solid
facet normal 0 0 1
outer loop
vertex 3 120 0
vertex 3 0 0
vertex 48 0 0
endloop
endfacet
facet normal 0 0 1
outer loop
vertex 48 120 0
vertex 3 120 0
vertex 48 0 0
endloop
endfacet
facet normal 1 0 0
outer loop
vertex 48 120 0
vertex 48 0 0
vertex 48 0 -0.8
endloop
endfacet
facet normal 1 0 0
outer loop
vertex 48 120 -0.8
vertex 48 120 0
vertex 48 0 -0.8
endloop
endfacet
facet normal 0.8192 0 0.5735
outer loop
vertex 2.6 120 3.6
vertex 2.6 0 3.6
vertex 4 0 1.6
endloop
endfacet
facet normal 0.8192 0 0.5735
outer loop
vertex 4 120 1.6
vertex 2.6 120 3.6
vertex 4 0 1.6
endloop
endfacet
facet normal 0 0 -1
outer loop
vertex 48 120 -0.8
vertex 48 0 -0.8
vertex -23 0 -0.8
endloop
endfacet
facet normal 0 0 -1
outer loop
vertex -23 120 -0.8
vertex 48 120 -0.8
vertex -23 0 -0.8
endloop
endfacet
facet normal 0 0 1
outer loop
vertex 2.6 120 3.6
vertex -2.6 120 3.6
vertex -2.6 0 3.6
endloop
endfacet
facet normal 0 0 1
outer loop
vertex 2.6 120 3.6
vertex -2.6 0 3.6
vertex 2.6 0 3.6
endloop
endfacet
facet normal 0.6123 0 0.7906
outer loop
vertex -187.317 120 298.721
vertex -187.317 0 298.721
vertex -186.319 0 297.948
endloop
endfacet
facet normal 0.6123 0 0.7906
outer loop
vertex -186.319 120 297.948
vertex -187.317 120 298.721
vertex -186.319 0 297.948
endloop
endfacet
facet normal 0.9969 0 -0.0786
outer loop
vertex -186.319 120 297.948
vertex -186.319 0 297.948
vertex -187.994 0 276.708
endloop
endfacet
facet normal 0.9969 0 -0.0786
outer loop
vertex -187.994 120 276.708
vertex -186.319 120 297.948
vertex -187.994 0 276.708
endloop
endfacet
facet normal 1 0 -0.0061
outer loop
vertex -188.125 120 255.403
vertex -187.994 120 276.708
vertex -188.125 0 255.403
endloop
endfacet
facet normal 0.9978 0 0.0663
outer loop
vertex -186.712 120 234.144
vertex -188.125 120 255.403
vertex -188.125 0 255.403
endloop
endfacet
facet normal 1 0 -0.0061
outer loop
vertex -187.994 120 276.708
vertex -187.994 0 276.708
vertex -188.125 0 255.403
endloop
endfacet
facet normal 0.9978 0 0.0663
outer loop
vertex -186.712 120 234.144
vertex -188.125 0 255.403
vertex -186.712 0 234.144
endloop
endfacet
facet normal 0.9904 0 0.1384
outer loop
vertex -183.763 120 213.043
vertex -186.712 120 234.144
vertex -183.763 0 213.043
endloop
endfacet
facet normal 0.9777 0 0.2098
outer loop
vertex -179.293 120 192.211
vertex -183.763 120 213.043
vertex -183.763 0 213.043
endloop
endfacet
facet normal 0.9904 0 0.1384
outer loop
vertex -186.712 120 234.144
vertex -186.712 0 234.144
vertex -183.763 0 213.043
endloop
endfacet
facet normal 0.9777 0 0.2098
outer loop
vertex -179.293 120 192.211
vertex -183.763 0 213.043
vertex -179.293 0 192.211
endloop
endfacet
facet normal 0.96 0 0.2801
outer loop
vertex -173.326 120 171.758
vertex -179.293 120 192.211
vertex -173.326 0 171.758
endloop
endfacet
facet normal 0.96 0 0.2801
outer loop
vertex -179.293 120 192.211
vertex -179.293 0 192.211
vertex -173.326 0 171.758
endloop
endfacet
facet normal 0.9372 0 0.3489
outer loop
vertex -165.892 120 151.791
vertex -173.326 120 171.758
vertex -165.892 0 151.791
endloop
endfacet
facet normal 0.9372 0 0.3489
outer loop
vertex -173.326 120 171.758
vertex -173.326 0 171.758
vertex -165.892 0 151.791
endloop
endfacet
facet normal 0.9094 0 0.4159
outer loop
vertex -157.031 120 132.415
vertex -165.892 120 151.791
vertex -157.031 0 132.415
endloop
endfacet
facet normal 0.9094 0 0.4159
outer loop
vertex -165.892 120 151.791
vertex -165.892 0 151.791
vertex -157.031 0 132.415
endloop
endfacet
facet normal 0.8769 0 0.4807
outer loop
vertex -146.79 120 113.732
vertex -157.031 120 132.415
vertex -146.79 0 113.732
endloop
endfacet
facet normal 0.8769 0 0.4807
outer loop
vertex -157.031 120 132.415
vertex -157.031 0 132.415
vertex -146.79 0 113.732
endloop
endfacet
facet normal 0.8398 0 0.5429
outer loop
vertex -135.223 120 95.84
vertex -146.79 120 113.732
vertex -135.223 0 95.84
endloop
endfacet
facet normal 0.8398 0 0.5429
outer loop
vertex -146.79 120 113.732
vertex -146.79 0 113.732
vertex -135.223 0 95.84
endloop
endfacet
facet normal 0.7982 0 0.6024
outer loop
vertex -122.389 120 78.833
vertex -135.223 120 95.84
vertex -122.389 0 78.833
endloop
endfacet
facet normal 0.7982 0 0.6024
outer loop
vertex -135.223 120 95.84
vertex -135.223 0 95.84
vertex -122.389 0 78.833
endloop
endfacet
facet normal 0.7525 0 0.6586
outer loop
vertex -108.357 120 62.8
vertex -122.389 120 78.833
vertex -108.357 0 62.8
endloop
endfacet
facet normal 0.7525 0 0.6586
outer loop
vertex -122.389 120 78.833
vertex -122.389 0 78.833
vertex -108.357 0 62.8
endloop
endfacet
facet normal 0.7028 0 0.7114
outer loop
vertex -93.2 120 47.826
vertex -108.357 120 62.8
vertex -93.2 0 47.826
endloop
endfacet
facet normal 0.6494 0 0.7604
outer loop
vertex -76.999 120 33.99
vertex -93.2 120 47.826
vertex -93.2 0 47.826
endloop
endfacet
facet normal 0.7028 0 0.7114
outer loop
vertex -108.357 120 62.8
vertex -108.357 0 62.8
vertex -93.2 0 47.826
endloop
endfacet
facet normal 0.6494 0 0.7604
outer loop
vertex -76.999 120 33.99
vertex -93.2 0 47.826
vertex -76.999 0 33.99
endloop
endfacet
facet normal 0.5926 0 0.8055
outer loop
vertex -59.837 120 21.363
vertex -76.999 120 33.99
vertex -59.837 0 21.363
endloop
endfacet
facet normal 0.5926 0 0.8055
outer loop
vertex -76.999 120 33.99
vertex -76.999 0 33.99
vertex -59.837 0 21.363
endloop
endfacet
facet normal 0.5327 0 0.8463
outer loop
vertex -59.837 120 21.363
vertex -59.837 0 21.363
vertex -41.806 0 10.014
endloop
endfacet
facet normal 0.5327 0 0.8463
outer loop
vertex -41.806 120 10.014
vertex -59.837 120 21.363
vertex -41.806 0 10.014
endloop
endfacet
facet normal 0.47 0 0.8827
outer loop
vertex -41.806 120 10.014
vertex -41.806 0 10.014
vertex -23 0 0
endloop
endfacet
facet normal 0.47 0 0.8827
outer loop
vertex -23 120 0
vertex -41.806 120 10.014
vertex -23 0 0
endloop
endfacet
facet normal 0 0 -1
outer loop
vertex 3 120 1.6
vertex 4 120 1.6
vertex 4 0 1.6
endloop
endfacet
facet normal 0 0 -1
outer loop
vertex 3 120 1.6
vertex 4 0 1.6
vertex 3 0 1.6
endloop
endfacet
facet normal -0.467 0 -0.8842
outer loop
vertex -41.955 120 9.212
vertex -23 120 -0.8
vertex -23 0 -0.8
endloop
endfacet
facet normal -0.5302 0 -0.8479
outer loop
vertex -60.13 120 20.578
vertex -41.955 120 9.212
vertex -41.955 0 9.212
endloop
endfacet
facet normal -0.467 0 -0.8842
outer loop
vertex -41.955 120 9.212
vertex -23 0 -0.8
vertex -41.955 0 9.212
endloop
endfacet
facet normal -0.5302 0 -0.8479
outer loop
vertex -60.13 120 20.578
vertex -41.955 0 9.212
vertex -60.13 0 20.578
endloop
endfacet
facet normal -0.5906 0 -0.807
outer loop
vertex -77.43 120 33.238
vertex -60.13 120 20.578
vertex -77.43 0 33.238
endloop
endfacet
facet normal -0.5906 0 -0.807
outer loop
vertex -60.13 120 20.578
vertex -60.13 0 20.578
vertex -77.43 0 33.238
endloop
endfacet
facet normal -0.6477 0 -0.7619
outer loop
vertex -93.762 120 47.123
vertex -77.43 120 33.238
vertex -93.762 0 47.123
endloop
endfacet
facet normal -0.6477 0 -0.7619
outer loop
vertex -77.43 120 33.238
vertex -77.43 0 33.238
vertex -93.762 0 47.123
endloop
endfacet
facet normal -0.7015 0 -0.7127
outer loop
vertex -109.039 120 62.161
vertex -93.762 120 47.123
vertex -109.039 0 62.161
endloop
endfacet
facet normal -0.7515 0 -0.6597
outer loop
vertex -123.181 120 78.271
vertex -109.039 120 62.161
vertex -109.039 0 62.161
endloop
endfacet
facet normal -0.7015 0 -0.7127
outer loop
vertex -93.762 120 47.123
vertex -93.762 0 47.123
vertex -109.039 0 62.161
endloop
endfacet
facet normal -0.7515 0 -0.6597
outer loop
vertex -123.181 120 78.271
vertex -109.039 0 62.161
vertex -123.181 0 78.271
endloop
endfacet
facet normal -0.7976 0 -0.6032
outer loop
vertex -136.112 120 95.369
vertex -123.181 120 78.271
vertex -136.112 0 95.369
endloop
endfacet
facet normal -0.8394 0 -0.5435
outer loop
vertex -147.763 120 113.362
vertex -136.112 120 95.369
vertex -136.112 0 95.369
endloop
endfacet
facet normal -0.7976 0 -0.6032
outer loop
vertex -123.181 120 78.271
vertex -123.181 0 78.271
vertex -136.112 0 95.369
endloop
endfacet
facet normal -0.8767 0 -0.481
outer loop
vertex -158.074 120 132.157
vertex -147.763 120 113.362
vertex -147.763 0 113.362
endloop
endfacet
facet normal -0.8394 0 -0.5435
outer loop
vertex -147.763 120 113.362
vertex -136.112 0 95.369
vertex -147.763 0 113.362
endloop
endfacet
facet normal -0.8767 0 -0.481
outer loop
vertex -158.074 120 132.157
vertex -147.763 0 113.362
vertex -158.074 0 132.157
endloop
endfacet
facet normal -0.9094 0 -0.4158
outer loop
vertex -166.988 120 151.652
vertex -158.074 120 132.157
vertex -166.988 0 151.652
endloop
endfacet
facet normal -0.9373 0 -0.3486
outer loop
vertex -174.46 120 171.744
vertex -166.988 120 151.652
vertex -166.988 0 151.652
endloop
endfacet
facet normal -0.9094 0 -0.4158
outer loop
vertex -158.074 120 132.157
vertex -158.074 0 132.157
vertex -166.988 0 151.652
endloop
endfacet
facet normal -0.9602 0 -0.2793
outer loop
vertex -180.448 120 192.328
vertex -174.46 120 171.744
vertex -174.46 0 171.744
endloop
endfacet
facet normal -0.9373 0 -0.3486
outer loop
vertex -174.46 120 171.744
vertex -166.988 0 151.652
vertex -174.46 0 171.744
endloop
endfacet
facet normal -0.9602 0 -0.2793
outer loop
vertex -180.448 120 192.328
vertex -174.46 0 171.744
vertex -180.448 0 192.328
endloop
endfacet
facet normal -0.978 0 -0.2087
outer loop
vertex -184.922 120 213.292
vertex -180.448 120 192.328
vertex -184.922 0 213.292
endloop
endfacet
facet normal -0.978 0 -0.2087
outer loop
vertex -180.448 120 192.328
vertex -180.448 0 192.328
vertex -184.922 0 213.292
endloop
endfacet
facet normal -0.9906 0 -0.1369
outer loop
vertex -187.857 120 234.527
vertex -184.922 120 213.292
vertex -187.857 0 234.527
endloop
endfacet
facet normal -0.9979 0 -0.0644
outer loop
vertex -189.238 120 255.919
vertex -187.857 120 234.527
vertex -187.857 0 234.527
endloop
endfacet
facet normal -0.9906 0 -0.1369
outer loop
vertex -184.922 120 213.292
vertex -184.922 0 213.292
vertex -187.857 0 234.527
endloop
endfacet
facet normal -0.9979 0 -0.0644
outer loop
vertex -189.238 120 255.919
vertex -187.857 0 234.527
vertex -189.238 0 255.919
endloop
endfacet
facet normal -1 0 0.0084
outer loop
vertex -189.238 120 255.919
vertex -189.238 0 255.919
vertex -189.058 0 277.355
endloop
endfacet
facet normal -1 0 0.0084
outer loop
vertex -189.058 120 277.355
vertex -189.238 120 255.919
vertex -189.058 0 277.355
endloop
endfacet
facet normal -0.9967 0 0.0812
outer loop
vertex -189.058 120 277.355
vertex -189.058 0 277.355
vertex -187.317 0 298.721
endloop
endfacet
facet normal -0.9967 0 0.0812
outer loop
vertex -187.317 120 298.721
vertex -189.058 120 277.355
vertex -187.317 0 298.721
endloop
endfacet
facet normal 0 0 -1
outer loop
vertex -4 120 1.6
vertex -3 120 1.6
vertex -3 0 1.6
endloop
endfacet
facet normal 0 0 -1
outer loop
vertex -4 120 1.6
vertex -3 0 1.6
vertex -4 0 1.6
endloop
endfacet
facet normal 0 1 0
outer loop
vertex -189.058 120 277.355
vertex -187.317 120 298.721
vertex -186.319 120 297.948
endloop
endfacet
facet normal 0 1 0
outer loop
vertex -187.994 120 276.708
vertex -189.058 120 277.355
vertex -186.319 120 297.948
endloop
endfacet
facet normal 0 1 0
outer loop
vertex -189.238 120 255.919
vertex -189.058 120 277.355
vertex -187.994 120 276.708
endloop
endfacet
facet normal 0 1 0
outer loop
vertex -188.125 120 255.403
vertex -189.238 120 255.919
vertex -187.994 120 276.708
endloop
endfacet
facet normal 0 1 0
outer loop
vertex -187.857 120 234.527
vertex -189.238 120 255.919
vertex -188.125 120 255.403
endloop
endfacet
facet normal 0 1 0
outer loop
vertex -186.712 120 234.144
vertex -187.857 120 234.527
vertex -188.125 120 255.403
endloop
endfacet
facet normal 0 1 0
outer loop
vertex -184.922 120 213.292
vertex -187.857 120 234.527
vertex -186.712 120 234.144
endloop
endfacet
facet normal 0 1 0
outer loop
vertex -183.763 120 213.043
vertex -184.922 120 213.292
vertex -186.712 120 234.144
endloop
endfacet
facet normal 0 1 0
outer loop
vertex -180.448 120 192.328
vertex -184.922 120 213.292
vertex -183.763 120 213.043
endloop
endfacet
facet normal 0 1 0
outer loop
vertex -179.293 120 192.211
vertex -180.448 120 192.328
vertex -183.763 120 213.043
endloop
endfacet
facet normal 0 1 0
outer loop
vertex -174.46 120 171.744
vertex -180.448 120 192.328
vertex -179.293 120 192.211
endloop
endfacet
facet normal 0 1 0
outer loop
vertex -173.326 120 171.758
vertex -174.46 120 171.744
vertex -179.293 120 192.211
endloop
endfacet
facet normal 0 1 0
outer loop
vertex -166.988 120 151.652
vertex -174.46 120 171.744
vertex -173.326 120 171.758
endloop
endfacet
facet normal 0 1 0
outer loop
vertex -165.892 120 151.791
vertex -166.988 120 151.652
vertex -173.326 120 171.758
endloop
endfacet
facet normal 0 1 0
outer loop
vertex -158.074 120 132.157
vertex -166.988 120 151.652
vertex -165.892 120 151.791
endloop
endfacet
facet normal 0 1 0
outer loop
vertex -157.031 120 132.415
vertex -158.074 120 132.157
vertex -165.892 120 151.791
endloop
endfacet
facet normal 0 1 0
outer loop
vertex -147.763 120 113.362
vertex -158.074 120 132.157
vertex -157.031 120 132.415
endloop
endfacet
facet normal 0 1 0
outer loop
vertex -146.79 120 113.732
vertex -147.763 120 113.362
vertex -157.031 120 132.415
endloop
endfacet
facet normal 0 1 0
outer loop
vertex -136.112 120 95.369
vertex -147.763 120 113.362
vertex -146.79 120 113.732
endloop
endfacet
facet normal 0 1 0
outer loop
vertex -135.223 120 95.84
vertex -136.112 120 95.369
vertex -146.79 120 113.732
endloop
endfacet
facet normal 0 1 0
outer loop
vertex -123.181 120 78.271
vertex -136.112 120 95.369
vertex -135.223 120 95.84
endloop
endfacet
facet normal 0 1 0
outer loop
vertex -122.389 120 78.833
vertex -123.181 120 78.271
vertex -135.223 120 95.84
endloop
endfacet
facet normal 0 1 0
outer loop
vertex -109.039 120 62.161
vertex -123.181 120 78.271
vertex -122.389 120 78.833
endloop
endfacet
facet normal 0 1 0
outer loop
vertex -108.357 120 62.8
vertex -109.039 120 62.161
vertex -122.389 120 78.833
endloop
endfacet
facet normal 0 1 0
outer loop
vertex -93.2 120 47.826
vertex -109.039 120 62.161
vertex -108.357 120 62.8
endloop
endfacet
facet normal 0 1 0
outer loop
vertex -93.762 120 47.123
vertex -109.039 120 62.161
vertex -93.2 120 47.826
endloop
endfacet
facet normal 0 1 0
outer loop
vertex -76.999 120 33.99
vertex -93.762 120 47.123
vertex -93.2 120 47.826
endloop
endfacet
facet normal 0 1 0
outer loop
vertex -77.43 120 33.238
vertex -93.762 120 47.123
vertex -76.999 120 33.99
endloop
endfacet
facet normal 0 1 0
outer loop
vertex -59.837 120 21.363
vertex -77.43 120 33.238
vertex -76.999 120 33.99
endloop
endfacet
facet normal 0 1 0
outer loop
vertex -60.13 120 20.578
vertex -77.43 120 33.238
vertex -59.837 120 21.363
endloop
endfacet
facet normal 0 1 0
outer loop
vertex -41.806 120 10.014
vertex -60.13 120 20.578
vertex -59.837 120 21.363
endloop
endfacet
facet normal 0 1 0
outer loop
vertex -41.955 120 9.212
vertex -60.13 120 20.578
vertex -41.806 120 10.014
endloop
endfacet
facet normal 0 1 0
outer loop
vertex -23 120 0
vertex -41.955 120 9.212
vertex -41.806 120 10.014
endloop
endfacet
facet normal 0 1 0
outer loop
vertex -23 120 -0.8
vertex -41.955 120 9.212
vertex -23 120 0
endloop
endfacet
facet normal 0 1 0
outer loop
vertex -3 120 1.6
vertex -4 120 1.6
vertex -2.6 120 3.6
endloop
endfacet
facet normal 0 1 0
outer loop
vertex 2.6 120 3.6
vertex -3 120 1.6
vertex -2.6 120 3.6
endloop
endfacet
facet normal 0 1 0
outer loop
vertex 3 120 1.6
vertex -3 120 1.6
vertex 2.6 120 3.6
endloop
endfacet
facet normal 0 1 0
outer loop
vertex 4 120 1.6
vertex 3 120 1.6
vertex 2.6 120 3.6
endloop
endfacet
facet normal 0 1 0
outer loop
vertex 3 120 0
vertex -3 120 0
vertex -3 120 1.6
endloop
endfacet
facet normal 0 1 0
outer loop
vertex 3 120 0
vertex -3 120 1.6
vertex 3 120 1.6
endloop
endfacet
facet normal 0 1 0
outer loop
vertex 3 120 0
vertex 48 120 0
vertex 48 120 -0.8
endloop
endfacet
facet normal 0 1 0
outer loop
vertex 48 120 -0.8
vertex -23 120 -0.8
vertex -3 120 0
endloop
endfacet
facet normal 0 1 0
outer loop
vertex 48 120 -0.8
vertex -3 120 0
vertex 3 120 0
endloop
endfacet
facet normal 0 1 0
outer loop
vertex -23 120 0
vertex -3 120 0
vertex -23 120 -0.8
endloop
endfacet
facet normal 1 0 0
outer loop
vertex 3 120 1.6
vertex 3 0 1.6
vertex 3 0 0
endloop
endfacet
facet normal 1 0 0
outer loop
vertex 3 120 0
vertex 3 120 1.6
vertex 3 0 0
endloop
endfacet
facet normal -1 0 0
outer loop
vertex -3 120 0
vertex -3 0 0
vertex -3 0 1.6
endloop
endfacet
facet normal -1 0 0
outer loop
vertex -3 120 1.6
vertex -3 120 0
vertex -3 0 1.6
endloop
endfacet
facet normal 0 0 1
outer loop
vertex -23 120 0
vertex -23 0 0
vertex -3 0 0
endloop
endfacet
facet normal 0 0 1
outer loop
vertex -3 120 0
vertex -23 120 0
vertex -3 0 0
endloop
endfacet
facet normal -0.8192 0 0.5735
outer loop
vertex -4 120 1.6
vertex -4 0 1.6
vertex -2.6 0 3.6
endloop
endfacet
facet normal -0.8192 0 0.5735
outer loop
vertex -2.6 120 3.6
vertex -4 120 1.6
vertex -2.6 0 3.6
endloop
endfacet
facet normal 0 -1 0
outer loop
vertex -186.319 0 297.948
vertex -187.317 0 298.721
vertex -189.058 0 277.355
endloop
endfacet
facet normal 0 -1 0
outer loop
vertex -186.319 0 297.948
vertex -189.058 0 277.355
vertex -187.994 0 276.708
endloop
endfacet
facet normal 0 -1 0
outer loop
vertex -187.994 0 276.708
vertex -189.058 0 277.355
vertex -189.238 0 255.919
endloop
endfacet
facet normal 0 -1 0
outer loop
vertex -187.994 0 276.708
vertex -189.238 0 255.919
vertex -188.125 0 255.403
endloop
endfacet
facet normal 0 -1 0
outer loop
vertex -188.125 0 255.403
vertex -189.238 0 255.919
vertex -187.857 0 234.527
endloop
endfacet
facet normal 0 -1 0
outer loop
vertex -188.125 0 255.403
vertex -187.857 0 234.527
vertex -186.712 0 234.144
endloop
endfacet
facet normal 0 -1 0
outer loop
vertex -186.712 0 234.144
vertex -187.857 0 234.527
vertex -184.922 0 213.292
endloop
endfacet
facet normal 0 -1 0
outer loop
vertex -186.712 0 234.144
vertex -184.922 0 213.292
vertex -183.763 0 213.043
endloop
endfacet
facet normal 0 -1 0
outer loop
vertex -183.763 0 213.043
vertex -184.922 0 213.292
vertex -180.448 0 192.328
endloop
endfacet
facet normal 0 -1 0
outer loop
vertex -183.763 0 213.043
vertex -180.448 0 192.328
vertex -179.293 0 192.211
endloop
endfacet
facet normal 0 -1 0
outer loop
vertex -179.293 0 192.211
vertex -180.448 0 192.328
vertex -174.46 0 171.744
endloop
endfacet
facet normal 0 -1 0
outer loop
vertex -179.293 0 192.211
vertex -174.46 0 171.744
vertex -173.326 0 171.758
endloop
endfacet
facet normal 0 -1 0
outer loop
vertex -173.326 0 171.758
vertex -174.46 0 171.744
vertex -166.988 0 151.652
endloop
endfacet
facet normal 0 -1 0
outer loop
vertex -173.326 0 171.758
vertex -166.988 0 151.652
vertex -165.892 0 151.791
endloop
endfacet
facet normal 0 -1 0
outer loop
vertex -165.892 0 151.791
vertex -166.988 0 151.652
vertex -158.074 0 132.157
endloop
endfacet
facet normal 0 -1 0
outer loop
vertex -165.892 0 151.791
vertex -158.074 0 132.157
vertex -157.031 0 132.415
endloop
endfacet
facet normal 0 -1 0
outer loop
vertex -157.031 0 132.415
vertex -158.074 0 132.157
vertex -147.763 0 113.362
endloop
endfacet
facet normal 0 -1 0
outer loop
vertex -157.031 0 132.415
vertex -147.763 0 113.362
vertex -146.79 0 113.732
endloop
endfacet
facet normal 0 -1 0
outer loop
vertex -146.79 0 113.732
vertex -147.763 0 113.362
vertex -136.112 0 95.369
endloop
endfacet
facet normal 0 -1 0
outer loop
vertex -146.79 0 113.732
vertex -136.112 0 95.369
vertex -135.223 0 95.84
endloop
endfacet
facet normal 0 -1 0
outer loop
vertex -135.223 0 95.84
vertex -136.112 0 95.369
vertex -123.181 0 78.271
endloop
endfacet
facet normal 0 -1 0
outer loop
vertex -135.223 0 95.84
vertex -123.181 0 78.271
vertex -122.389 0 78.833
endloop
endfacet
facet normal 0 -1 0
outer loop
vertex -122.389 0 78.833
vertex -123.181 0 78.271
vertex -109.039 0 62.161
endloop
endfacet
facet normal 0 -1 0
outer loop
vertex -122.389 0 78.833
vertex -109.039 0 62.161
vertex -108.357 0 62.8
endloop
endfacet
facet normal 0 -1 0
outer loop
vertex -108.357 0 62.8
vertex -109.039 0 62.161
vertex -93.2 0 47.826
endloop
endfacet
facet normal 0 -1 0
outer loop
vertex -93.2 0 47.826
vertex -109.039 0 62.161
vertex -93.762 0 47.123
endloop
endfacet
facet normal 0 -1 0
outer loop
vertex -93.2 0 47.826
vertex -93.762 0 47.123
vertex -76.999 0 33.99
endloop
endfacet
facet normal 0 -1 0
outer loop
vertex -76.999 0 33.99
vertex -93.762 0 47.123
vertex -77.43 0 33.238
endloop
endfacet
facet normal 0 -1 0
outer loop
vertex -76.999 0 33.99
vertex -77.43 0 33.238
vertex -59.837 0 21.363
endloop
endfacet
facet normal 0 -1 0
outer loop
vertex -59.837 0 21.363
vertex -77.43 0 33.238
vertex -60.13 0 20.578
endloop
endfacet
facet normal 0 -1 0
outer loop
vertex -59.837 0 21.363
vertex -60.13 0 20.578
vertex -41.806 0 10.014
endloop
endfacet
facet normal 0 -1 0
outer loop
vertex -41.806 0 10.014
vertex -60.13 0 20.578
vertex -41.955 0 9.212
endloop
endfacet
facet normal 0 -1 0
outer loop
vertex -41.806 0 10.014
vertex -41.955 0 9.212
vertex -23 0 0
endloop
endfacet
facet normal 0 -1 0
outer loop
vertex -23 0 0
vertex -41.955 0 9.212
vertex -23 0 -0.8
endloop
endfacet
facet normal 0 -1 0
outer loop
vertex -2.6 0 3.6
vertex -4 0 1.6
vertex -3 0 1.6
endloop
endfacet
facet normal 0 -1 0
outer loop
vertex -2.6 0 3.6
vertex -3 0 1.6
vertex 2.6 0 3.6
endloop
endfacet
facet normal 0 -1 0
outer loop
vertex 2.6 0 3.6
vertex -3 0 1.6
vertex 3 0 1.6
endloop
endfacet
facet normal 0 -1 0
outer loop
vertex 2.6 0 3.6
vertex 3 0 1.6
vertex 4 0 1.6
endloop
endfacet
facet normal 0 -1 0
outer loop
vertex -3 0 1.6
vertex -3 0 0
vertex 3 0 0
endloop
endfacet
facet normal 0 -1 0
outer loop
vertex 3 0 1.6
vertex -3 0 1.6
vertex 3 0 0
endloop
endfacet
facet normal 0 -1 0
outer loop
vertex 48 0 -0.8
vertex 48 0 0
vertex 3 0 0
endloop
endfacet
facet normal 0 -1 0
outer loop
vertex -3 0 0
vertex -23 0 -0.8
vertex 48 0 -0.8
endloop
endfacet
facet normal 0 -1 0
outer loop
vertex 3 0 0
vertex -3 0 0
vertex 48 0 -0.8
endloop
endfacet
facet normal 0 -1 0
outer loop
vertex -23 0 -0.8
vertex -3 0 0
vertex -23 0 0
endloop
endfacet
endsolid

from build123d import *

# Parameters (mm, degrees)
BOSS_EXTRUDE1_DEPTH = 120


with BuildPart() as part:
    # Sketch1 → Boss-Extrude1 (new body)
    with BuildSketch(Plane(origin=(0, 0, 0), x_dir=(1, 0, 0), z_dir=(0, 1, 0))):
        with BuildLine():
            Line((-3, 0), (-3, -1.6))
            Line((-3, -1.6), (-4, -1.6))
            Line((-4, -1.6), (-2.599584924, -3.6))
            Line((-2.599584924, -3.6), (2.599584924, -3.6))
            Line((2.599584924, -3.6), (4, -1.6))
            Line((4, -1.6), (3, -1.6))
            Line((3, -1.6), (3, 0))
            Line((3, 0), (48, 0))
            Line((48, 0), (48, 0.8))
            Line((48, 0.8), (-23, 0.8))
            ThreePointArc((-23, 0.8), (-153.089844763, -122.665428697), (-187.317261189, -298.720998783))
            Line((-187.317261189, -298.720998783), (-186.319141297, -297.948173118))
            ThreePointArc((-186.319141297, -297.948173118), (-152.080290875, -122.980601765), (-23, 0))
            Line((-23, 0), (-3, 0))
        make_face()
    extrude(amount=BOSS_EXTRUDE1_DEPTH)


solid = part.part
